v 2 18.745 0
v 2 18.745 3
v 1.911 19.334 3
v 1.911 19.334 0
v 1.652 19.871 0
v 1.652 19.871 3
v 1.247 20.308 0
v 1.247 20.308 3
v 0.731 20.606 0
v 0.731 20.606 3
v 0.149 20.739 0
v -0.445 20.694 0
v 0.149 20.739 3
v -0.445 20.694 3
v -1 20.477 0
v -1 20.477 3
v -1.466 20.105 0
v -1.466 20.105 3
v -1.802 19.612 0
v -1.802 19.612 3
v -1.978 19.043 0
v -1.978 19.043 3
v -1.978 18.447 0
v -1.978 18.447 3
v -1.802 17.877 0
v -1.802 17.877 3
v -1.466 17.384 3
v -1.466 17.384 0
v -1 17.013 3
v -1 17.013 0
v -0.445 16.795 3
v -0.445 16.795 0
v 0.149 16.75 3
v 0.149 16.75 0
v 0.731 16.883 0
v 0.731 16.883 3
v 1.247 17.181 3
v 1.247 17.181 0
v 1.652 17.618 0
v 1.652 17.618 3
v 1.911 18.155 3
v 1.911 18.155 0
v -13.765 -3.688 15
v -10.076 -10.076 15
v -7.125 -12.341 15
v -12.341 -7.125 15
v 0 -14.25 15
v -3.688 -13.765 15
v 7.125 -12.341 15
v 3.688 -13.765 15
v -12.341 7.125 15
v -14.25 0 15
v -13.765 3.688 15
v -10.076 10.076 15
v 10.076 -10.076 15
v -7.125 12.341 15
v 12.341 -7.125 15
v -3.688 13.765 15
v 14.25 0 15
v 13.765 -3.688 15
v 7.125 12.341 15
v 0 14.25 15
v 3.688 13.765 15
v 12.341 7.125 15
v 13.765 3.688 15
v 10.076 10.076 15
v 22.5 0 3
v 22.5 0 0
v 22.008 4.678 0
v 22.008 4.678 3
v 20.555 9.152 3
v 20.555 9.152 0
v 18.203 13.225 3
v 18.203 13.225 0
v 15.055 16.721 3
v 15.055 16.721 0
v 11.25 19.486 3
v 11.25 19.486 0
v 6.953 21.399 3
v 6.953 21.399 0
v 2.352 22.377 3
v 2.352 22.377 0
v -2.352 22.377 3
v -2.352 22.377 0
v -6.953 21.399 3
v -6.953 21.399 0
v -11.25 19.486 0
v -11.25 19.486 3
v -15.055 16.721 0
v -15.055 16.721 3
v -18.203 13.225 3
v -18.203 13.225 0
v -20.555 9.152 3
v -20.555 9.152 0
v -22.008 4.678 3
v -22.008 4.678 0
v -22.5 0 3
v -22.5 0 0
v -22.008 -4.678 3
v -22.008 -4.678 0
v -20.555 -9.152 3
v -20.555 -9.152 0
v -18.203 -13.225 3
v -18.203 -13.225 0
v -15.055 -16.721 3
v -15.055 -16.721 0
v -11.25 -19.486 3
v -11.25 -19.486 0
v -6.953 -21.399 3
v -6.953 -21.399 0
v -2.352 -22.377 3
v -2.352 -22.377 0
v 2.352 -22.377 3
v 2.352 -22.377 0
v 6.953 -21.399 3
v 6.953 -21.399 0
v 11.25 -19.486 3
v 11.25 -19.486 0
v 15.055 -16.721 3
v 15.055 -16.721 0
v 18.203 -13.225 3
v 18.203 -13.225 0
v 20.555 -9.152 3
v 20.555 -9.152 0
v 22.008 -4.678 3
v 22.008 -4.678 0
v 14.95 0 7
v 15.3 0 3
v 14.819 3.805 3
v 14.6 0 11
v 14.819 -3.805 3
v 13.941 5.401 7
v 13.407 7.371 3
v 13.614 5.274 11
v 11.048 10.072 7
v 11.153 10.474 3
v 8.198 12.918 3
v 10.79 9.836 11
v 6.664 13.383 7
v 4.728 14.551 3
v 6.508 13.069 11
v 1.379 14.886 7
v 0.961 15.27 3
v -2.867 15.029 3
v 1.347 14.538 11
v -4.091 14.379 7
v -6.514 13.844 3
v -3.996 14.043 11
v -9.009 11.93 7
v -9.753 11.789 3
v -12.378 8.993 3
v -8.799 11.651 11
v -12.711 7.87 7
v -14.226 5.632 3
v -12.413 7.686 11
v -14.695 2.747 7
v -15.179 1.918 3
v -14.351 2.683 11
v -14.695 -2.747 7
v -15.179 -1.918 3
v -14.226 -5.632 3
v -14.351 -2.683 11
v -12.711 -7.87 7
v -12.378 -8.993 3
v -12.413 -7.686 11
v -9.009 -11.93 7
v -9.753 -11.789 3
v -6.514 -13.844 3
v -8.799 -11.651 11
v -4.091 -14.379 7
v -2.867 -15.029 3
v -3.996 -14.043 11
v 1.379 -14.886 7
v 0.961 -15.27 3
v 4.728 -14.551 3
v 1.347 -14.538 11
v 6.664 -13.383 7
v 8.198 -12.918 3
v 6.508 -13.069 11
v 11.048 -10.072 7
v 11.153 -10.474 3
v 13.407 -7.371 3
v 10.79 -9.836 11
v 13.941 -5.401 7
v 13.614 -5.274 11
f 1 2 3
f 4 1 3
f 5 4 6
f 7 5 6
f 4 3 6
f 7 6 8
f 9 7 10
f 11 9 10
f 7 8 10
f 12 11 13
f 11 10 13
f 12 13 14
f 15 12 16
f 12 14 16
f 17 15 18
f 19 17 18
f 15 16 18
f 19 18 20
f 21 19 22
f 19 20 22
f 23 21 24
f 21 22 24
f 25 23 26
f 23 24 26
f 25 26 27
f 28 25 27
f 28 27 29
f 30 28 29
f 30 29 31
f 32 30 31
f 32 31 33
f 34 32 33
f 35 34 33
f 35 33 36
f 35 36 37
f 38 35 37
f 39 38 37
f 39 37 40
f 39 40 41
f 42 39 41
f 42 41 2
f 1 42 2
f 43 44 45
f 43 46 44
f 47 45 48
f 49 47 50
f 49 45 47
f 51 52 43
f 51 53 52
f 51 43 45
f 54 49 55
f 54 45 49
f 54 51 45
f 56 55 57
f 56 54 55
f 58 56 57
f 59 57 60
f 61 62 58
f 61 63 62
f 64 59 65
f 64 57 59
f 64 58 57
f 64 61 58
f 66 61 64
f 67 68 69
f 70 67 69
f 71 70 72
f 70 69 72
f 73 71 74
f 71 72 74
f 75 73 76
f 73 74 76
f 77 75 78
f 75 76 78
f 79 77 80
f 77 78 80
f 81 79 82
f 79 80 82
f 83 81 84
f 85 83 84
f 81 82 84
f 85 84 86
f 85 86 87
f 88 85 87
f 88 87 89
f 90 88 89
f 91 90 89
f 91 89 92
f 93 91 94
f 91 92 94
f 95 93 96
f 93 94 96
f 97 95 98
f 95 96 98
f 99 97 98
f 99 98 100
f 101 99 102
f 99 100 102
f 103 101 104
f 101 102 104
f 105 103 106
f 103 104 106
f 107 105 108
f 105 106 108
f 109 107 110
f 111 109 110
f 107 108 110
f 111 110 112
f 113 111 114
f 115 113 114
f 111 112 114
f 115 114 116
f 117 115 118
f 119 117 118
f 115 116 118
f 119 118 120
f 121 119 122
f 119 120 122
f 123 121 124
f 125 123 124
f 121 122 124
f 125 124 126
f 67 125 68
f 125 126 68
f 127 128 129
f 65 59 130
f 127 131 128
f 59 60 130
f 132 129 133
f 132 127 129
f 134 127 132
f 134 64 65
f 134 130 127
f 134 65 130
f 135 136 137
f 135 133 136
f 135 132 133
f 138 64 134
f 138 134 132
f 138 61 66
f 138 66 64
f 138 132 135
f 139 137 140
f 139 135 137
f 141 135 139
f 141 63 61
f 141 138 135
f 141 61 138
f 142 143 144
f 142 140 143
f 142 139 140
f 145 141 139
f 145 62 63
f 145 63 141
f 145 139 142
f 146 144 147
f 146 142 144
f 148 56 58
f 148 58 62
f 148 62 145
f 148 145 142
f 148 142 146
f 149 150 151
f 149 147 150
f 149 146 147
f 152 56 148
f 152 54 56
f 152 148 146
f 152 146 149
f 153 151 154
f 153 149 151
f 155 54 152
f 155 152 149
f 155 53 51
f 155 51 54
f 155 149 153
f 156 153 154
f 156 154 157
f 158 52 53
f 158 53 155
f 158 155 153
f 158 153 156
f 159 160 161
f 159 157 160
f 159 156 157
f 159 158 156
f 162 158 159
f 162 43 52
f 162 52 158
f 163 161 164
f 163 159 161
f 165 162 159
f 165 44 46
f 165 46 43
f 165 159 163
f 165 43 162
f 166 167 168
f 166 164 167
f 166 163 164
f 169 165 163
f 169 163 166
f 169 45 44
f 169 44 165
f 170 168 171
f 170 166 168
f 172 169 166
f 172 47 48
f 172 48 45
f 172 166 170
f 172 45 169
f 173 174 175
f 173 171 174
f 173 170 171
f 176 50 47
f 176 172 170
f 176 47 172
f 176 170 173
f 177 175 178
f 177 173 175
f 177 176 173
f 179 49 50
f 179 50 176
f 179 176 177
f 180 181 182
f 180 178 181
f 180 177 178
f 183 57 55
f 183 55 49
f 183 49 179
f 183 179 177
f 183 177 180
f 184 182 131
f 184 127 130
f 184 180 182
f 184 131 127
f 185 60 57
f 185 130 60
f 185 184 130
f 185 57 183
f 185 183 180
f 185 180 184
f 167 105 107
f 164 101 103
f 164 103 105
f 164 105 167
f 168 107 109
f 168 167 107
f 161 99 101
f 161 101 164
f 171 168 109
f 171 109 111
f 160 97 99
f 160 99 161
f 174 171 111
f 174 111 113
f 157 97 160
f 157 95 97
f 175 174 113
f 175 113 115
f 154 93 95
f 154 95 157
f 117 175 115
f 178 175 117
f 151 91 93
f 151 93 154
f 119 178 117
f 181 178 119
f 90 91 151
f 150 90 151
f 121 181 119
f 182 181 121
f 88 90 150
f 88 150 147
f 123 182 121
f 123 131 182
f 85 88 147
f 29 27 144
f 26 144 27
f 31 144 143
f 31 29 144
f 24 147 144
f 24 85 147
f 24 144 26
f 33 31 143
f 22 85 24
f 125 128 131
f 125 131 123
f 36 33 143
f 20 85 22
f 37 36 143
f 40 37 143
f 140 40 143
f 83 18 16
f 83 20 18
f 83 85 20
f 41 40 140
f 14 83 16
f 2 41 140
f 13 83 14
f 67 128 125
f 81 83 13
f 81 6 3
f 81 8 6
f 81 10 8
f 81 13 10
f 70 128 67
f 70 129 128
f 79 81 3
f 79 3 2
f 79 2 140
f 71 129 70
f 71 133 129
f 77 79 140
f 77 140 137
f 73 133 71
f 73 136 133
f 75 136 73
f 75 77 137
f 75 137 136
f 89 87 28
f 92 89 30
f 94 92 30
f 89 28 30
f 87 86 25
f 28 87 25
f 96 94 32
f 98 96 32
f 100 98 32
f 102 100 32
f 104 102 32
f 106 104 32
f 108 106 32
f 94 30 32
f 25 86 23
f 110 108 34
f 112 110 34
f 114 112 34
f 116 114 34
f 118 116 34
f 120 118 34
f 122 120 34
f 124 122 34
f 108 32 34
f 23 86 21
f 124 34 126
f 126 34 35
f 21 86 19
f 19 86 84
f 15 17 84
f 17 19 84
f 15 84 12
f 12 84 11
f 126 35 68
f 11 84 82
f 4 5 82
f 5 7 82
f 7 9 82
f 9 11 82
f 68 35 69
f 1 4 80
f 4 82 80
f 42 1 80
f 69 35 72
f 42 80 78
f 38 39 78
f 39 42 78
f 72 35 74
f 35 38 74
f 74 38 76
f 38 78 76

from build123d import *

# Parameters (mm, degrees)
F0_R     = 22.5
F0_R_2   = 15.3
F1_DEPTH = 3
F2_R     = 15.3
F3_DEPTH = 12
F3_TAPER = 5
F4_R     = 2
F5_DEPTH = 32.3


with BuildPart() as f1:
    # F0 (on Top) → F1 (new body)
    with BuildSketch(Plane.XY):
        Circle(F0_R)
        Circle(F0_R_2, mode=Mode.SUBTRACT)
        Circle(F0_R_2)
    extrude(amount=F1_DEPTH)

    # F2 (on face) → F3 (join)
    with BuildSketch(Plane.XY.offset(3)):
        Circle(F2_R)
    extrude(amount=F3_DEPTH, taper=F3_TAPER)

    # F4 (on face) → F5 (cut)
    with BuildSketch(Plane.XY.offset(3)):
        with Locations((0, 18.7446177006)):
            Circle(F4_R)
    extrude(amount=-F5_DEPTH, mode=Mode.SUBTRACT)


solid = f1.part
